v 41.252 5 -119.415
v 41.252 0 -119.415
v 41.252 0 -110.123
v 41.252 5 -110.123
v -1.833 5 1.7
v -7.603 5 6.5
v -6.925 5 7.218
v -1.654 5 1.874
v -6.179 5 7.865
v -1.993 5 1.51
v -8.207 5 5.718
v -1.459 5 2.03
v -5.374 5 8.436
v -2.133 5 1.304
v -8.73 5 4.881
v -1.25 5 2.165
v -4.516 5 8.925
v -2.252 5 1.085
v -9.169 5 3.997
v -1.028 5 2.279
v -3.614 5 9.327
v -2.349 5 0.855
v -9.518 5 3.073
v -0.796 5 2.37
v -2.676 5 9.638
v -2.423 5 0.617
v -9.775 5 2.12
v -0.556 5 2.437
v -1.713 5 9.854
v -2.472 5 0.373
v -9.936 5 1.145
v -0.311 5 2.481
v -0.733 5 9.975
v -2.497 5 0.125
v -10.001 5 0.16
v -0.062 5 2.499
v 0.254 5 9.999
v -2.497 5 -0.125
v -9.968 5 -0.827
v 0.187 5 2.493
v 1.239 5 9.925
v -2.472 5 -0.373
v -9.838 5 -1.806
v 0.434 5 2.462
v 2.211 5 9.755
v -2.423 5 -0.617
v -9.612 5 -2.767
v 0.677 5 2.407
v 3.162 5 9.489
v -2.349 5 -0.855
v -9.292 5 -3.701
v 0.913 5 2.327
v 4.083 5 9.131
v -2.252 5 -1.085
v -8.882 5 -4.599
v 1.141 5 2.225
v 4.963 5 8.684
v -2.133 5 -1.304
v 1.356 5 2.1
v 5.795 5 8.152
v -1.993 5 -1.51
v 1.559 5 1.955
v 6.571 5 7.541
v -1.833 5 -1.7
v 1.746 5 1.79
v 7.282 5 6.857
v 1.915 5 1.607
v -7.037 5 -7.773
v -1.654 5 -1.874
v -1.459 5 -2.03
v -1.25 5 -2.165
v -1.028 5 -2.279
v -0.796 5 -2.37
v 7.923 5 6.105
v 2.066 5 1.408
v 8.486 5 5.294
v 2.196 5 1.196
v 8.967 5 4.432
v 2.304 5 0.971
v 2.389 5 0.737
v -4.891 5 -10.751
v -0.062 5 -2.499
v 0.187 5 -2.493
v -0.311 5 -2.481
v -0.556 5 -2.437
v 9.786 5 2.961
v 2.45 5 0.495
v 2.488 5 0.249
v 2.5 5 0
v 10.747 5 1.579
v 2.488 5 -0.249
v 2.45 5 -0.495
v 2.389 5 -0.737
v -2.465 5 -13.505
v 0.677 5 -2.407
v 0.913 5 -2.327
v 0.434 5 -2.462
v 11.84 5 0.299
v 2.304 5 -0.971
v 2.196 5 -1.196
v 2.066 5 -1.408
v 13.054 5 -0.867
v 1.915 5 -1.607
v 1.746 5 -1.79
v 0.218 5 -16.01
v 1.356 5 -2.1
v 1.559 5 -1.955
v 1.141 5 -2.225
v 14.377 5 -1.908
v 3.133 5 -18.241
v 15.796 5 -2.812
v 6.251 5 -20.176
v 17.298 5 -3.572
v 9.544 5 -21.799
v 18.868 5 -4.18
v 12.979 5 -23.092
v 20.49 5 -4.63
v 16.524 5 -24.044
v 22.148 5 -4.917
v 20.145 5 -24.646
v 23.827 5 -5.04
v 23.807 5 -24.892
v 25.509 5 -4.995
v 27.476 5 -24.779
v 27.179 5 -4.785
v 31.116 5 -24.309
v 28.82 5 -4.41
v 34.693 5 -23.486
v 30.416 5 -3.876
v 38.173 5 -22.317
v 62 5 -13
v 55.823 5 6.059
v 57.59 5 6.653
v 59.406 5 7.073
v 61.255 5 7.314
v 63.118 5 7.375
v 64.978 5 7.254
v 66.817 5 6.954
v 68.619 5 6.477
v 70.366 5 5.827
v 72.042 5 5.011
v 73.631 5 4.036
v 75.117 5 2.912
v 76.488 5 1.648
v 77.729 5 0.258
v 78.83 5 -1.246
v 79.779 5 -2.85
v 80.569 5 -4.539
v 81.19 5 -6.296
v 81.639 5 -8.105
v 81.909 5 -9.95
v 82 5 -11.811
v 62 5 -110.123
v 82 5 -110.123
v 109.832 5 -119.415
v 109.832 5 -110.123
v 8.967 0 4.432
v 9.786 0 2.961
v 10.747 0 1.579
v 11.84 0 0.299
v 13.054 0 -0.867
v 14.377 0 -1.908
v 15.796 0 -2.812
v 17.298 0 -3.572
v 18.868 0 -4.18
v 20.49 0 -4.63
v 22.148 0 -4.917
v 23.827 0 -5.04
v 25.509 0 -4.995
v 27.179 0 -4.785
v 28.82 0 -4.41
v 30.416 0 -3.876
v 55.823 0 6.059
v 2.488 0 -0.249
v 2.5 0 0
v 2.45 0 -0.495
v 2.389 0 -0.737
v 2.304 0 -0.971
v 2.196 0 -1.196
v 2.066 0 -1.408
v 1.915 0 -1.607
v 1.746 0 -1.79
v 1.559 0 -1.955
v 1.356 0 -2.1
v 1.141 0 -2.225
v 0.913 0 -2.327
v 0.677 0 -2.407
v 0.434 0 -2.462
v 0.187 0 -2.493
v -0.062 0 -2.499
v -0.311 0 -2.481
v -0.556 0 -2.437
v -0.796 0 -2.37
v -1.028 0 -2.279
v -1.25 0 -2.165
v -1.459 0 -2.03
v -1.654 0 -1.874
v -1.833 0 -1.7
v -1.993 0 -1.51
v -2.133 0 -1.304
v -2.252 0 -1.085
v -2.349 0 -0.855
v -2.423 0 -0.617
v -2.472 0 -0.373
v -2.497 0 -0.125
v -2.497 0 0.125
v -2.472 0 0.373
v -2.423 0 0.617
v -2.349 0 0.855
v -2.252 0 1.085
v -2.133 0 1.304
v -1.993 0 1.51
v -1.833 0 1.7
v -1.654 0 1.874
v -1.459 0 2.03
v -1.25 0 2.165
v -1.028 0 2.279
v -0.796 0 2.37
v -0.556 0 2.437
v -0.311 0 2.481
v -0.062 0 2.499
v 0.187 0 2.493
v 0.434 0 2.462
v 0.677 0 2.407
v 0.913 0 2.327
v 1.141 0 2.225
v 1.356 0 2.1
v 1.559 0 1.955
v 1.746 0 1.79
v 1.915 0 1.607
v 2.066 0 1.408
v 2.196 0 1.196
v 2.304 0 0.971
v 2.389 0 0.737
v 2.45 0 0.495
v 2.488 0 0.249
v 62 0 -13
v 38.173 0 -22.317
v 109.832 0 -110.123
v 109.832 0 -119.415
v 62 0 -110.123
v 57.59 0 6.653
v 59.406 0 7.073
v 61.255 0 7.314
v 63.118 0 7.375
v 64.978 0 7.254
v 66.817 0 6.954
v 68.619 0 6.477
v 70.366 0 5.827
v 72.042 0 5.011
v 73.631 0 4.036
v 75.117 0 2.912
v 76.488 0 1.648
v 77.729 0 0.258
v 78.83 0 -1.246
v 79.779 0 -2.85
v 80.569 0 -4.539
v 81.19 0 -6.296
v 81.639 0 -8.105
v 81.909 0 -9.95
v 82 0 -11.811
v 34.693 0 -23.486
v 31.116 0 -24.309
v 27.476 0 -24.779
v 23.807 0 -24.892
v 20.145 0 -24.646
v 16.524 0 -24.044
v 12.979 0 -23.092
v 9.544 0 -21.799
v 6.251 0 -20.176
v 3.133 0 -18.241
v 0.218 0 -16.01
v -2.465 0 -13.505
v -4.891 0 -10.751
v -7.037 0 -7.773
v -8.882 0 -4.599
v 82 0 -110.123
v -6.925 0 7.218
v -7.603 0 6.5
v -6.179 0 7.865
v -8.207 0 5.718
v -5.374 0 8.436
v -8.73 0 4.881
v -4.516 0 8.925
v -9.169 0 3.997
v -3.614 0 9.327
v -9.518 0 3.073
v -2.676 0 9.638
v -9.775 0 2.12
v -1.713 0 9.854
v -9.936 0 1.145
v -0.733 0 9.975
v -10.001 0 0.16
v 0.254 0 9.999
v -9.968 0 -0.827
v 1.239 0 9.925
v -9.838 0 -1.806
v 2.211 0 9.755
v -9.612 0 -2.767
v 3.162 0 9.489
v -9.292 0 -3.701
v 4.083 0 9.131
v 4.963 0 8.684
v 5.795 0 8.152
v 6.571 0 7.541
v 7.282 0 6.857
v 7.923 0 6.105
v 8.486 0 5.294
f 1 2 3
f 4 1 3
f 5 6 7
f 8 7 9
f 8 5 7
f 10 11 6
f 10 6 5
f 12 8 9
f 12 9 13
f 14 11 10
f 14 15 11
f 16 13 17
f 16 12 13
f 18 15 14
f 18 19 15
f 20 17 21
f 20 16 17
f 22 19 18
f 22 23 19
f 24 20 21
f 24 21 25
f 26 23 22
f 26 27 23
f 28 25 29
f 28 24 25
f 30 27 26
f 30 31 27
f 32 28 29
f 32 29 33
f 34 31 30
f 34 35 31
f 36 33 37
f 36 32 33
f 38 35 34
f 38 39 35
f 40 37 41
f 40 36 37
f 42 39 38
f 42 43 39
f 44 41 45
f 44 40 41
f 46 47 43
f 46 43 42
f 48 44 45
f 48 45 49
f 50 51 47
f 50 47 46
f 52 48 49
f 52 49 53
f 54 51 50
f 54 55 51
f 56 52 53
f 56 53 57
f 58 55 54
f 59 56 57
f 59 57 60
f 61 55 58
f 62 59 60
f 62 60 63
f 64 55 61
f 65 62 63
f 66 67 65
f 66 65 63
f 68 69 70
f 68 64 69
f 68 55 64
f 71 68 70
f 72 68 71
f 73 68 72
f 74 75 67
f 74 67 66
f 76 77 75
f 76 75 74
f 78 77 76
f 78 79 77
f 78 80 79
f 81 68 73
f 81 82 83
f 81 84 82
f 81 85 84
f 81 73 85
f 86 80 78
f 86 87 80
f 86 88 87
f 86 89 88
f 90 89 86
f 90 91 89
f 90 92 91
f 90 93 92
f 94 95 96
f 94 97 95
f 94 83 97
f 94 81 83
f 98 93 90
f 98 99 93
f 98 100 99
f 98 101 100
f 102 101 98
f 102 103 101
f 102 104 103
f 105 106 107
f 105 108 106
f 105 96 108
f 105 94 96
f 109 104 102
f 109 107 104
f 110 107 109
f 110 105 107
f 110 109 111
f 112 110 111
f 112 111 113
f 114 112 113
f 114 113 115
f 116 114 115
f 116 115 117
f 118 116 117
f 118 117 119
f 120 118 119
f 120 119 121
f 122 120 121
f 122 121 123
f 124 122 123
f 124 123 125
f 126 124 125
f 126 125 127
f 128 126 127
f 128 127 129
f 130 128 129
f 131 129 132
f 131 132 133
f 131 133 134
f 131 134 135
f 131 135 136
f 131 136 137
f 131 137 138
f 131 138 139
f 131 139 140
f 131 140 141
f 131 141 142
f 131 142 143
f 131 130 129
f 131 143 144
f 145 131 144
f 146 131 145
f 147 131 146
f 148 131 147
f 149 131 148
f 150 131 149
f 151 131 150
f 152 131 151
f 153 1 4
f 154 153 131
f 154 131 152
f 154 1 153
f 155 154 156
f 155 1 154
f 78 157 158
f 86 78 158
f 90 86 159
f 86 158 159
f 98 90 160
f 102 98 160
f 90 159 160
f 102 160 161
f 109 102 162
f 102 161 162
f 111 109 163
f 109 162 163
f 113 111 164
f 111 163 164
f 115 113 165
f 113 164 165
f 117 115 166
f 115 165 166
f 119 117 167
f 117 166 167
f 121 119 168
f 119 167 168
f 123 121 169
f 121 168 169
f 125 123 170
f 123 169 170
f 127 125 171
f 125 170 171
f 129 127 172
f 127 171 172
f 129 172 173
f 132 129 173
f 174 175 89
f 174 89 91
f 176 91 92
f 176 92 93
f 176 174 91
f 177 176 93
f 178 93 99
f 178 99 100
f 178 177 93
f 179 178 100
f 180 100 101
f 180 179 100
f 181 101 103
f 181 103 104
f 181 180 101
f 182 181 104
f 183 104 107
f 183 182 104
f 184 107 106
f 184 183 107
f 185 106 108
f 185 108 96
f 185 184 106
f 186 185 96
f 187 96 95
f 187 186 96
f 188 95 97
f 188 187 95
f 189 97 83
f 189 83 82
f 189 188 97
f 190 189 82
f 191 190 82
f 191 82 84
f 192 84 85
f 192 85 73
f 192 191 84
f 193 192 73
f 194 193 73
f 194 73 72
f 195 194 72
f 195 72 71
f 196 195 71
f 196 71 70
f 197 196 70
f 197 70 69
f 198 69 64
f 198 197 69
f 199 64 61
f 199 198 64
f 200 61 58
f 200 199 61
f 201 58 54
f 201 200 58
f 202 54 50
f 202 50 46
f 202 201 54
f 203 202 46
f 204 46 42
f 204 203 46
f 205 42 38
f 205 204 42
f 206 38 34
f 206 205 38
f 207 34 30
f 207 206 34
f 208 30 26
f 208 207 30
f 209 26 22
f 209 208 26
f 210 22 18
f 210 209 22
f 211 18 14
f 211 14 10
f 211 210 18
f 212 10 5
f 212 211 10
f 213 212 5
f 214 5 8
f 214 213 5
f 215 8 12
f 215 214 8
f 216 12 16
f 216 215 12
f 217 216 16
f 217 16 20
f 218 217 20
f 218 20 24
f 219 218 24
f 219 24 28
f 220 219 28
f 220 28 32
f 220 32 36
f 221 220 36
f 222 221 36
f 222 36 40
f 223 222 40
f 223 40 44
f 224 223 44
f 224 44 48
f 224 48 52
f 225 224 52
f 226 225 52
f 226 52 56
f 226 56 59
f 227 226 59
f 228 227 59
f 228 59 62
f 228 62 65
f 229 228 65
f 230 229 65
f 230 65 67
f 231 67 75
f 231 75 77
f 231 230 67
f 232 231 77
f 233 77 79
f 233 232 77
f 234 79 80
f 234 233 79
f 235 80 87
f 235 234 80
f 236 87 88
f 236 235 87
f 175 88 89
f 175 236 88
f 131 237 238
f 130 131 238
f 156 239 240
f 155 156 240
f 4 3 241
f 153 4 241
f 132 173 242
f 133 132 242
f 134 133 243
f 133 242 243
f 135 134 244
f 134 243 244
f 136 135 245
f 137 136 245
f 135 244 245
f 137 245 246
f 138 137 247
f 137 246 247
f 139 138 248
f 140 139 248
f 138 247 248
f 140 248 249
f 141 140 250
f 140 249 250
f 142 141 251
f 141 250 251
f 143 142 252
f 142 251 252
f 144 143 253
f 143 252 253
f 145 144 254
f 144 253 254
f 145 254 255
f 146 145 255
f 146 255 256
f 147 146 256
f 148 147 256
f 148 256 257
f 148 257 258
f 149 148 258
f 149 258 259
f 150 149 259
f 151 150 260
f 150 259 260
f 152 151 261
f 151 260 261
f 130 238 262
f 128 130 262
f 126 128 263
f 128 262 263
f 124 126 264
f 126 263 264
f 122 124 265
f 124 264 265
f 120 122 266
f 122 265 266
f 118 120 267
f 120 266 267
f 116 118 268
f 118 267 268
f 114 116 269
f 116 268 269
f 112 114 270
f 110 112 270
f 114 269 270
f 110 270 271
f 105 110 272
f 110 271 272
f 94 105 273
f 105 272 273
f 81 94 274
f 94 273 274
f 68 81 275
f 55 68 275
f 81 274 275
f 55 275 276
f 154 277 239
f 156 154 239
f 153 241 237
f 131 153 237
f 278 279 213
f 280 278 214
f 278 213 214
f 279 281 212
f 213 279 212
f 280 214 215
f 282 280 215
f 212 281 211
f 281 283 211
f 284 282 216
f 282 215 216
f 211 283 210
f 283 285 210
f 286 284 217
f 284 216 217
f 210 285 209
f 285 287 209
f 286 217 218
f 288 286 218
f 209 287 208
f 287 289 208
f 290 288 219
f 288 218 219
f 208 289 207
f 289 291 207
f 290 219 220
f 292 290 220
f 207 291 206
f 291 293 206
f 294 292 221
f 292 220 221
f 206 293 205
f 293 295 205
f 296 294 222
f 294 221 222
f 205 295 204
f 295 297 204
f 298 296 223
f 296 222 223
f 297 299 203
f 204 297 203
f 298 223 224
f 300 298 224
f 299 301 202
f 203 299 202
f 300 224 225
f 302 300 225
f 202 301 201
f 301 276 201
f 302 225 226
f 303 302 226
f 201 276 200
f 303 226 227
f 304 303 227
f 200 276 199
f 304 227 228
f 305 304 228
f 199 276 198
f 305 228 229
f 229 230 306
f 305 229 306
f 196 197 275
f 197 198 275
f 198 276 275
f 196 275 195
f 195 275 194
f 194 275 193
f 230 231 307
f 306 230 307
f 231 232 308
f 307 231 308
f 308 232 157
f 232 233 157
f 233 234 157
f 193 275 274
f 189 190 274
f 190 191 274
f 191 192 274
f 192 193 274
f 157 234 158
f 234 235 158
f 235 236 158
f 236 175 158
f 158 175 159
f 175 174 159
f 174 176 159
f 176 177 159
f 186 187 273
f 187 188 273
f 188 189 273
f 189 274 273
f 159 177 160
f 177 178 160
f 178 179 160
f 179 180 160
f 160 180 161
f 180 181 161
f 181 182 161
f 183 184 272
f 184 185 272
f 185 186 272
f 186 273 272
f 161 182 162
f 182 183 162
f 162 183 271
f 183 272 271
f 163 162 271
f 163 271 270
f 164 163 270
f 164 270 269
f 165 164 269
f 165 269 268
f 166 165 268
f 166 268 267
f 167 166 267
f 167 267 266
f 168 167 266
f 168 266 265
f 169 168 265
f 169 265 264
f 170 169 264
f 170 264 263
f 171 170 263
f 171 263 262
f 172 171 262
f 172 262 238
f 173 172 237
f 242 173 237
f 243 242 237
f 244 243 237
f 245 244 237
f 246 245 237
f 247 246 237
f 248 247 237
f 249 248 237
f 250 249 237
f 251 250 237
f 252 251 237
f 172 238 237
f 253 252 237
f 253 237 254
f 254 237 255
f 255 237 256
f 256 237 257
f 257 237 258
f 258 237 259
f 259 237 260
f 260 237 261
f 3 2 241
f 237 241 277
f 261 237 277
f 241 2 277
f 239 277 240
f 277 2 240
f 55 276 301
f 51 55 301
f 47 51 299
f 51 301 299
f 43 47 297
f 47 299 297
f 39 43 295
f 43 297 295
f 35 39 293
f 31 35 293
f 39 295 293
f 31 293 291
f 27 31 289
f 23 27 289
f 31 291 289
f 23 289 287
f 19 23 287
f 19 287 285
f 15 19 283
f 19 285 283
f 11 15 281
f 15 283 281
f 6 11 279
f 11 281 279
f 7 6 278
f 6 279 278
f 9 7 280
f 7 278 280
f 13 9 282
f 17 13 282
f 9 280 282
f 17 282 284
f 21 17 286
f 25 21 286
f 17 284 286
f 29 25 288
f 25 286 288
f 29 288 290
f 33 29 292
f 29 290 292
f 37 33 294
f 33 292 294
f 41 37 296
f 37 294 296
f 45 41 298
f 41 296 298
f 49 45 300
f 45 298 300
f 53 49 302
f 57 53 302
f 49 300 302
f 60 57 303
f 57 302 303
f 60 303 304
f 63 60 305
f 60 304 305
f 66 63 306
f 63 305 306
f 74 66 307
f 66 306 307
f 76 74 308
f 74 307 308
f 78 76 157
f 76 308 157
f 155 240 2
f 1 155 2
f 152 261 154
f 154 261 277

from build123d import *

# Parameters (mm, degrees)
ESQUISSE1_R        = 2.5
BOSS_EXTRU_1_DEPTH = 5


with BuildPart() as part:
    # Esquisse1 → Boss.-Extru.1 (new body)
    with BuildSketch(Plane(origin=(0, 0, 0), x_dir=(1, 0, 0), z_dir=(0, 1, 0))):
        with BuildLine():
            Line((30.416462038, 3.875687745), (55.823272708, -6.059403674))
            ThreePointArc((55.823272708, -6.059403674), (73.630583756, -4.03622534), (82, 11.811375395))
            Line((82, 11.811375395), (82, 110.123102525))
            Line((82, 110.123102525), (109.832159843, 110.123102525))
            Line((109.832159843, 110.123102525), (109.832159843, 119.415014129))
            Line((109.832159843, 119.415014129), (41.252434476, 119.415014129))
            Line((41.252434476, 119.415014129), (41.252434476, 110.123102525))
            Line((41.252434476, 110.123102525), (62, 110.123102525))
            Line((62, 110.123102525), (62, 13))
            Line((62, 13), (38.173084143, 22.317288594))
            ThreePointArc((38.173084143, 22.317288594), (11.245695012, 22.487512145), (-8.882082163, 4.599363906))
            ThreePointArc((-8.882082163, 4.599363906), (-4.515728742, -8.924893603), (8.966917542, -4.431695127))
            ThreePointArc((8.966917542, -4.431695127), (18.075204101, 3.89573938), (30.416462038, 3.875687745))
        make_face()
        Circle(ESQUISSE1_R, mode=Mode.SUBTRACT)
    extrude(amount=BOSS_EXTRU_1_DEPTH)


solid = part.part
